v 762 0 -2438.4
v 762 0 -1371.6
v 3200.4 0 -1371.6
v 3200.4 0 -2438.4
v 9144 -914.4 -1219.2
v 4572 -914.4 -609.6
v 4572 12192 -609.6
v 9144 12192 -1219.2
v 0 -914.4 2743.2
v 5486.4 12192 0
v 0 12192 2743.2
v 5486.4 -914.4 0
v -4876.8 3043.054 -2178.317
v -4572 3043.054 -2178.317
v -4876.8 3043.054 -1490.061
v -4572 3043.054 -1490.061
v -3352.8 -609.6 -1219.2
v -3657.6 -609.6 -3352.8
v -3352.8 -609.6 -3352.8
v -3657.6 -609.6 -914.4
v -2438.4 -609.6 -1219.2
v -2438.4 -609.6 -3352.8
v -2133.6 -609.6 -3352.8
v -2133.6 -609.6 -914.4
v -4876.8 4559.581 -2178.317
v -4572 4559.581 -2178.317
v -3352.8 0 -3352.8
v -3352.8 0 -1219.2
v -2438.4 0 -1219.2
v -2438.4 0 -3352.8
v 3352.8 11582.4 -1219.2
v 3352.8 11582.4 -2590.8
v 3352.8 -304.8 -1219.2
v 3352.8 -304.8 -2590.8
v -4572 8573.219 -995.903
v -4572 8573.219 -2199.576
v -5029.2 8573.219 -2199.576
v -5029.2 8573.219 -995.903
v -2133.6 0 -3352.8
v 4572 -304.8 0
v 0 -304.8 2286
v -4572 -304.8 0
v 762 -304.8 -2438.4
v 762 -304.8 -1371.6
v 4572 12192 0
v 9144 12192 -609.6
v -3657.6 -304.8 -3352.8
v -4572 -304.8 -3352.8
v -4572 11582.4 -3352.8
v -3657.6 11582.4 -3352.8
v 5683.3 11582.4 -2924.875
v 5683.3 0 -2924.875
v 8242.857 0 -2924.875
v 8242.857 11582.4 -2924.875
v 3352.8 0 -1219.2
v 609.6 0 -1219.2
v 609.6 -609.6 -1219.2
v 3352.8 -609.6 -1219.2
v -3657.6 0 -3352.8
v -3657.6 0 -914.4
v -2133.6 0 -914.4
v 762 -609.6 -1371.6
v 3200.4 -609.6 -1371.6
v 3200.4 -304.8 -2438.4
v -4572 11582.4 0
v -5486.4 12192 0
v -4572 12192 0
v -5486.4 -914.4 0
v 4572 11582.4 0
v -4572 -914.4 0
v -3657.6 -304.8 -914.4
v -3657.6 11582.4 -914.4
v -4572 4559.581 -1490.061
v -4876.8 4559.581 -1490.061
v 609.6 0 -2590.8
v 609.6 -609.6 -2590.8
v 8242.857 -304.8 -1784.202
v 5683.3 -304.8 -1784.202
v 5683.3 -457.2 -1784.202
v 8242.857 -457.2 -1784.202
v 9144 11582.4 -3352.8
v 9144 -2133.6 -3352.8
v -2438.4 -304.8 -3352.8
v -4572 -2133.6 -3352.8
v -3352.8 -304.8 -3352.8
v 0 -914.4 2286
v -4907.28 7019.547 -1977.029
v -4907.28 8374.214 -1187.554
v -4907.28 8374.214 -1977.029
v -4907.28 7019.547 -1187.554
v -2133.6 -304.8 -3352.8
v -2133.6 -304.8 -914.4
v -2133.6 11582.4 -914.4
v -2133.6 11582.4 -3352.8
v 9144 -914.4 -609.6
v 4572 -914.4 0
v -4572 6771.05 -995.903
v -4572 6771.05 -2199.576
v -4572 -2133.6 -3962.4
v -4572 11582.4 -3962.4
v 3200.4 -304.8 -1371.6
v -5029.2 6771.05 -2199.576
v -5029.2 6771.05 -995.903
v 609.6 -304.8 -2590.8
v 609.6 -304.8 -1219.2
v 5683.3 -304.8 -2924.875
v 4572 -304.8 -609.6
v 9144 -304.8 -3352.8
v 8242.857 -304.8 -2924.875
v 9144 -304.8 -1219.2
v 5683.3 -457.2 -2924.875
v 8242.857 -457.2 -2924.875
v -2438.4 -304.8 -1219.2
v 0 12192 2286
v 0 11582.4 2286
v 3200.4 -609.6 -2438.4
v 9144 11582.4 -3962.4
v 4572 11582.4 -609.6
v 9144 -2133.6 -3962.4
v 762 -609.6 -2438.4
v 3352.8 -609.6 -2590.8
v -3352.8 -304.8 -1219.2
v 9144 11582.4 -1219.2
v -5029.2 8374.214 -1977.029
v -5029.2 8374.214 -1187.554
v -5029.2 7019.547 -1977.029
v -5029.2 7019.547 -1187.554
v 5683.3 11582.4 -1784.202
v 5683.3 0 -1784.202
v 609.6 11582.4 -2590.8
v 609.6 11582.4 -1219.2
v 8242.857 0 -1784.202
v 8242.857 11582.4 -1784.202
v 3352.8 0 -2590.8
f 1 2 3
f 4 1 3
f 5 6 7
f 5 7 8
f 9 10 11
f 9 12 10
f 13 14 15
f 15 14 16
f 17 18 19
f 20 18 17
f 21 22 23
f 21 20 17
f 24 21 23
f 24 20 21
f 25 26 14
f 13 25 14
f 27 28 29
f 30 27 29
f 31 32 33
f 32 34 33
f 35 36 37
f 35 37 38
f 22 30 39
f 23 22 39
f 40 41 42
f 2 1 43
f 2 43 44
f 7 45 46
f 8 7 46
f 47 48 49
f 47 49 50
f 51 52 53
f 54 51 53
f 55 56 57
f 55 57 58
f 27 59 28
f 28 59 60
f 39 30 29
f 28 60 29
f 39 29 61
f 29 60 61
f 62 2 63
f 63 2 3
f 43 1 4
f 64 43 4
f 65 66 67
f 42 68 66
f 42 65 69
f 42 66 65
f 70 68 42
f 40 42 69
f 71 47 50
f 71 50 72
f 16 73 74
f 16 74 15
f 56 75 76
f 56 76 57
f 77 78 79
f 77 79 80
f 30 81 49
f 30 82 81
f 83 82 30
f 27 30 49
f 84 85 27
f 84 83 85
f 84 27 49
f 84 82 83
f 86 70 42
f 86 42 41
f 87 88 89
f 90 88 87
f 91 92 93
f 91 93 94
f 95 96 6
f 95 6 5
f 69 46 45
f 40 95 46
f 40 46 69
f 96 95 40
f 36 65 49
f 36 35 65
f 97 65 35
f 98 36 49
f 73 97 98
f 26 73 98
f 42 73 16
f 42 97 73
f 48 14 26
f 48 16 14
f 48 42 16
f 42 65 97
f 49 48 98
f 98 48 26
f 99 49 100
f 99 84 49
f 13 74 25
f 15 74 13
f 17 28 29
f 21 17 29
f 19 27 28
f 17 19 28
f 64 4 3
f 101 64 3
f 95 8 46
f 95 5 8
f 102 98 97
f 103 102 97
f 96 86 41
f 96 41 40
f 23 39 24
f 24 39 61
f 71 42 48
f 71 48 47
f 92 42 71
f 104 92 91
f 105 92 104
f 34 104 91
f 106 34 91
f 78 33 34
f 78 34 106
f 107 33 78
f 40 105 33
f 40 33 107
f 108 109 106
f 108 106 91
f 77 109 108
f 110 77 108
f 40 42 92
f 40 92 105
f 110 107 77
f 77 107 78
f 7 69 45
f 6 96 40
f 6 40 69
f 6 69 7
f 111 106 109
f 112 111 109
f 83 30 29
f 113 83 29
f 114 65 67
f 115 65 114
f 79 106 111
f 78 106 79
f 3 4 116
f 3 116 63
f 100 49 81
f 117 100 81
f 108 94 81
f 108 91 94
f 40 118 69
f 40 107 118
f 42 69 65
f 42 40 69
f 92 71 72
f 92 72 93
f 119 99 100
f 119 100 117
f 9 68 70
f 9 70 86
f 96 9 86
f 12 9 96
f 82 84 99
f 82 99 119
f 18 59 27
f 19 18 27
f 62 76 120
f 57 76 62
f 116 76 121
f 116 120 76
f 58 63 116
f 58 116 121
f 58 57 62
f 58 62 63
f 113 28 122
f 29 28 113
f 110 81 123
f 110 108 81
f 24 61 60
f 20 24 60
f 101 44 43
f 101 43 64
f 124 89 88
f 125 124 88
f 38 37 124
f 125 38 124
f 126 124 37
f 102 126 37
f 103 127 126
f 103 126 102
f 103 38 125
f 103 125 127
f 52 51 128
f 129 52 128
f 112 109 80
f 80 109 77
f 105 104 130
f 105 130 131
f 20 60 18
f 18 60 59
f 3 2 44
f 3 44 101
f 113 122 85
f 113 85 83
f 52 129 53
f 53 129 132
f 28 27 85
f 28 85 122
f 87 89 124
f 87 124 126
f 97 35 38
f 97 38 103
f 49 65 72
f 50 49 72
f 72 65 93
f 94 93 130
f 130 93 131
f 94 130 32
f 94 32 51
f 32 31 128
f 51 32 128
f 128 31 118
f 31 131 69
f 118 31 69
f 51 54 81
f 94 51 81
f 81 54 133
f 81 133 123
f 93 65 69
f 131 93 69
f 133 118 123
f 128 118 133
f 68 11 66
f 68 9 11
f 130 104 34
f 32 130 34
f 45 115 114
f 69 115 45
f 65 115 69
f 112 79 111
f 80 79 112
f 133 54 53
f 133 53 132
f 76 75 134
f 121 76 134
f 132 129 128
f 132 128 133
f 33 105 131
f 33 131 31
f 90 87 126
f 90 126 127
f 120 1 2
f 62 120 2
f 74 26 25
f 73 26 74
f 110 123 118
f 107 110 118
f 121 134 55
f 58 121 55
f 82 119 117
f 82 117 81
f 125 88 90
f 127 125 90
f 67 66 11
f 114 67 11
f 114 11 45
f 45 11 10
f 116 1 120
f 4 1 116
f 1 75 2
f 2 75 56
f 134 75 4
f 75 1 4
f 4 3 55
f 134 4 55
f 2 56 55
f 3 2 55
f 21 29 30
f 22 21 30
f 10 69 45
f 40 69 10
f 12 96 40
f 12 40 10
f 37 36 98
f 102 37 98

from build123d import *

# Parameters (mm, degrees)
F1_DEPTH      = 914.4
F1_DEPTH_BACK = 12192
F2_DEPTH      = 304.8
F2_DEPTH_BACK = 11582.4
F0_W          = 4572
F0_H          = 609.6
F3_DEPTH      = 2133.6
F3_DEPTH_BACK = 11582.4
F0_W_2        = 2743.2
F0_H_2        = 1371.6
F0_W_3        = 2559.5574378967
F0_H_3        = 1140.672326088
F4_DEPTH      = 304.8
F4_DEPTH_BACK = 11582.4
F0_W_4        = 914.4
F0_H_4        = 2133.6
F5_DEPTH      = 304.8
F0_W_5        = 2438.4
F0_H_5        = 1066.8
F6_DEPTH      = 609.6
F7_W          = 1354.6671867371
F7_H          = 789.4748449326
F8_DEPTH      = 30.48
F7_W_2        = 1802.1693229675
F7_H_2        = 1203.6726474762
F9_DEPTH      = 457.2
F10_DEPTH     = 304.8
F7_W_3        = 1516.5266990662
F7_H_3        = 688.2555484772
F11_DEPTH     = 304.8
F0_W_6        = 1864.025592804
F0_H_6        = 417.3192977905
F13_DEPTH     = 457.2


# Not quite as in the source:
# - the program builds the solid bodies; features that only make, move or delete a surface that nothing else refers to are left out


with BuildPart() as f1:
    # F0 (on Front) → F1 (new body, two sides)
    with BuildSketch(Plane.XZ) as f1_sk:
        Polygon((-5486.4, 0), (-4572, 0), (0, 2286), (0, 2743.2), align=None)
        Polygon((0, 2286), (4572, 0), (5486.4, 0), (0, 2743.2), align=None)
    extrude(amount=F1_DEPTH)
    extrude(f1_sk.sketch, amount=-F1_DEPTH_BACK)



with BuildPart() as f1b:
    # F0 (on Front) → F1, piece 2 (new body, two sides)
    with BuildSketch(Plane.XZ) as f1_2_sk:
        Polygon((9144, -609.6), (4572, 0), (4572, -609.6), (9144, -1219.2), align=None)
    extrude(amount=F1_DEPTH)
    extrude(f1_2_sk.sketch, amount=-F1_DEPTH_BACK)


with BuildPart() as f1_1:
    add(f1.part)

    add(f1b.part)  # F2 merges F1b
    # F0 (on Front) → F2 (join, two sides)
    with BuildSketch(Plane.XZ) as f2_sk:
        Polygon((-4572, 0), (0, 0), (0, 2286), align=None)
        Polygon((0, 2286), (0, 0), (4572, 0), align=None)
    extrude(amount=F2_DEPTH)
    extrude(f2_sk.sketch, amount=-F2_DEPTH_BACK)


with BuildPart() as f3:
    # F0 (on Front) → F3 (new body, two sides)
    with BuildSketch(Plane.XZ) as f3_sk:
        Polygon((-3657.6, -3352.8), (-4572, -3352.8), (-4572, -3962.4), (4572, -3962.4), (4572, -3352.8), (-2133.6, -3352.8), (-2438.4, -3352.8), (-3352.8, -3352.8), align=None)
        with Locations((6858, -3657.6)):
            Rectangle(F0_W, F0_H)
    extrude(amount=F3_DEPTH)
    extrude(f3_sk.sketch, amount=-F3_DEPTH_BACK)

    # F0 (on Front) → F5 (join)
    with BuildSketch(Plane.XZ):
        with Locations((-2895.6, -2286)):
            Rectangle(F0_W_4, F0_H_4)
    extrude(amount=F5_DEPTH)


with BuildPart() as f4:
    # F0 (on Front) → F4 (new body, two sides)
    with BuildSketch(Plane.XZ) as f4_sk:
        Polygon((4572, 0), (0, 0), (-4572, 0), (-4572, -3352.8), (-3657.6, -3352.8), (-3657.6, -914.4), (-2133.6, -914.4), (-2133.6, -3352.8), (4572, -3352.8), (4572, -609.6), align=None)
        with Locations((1981.2, -1905)):
            Rectangle(F0_W_2, F0_H_2, mode=Mode.SUBTRACT)
        Polygon((9144, -1219.2), (4572, -609.6), (4572, -3352.8), (9144, -3352.8), align=None)
        with Locations((6963.0782604218, -2354.5383810997)):
            Rectangle(F0_W_3, F0_H_3, mode=Mode.SUBTRACT)
    extrude(amount=F4_DEPTH)
    extrude(f4_sk.sketch, amount=-F4_DEPTH_BACK)

    # F7 (on face) → F8 (join)
    with BuildSketch(Plane(origin=(-4572, 0, 0), x_dir=(0, -1, 0), z_dir=(-1, 0, 0))):
        with Locations((-7696.8805789948, -1582.2919011116)):
            Rectangle(F7_W, F7_H)
    extrude(amount=F8_DEPTH)

    # F7 (on face) → F9 (join)
    with BuildSketch(Plane(origin=(-4572, 0, 0), x_dir=(0, -1, 0), z_dir=(-1, 0, 0))):
        with Locations((-7672.1346378326, -1597.7395772934)):
            Rectangle(F7_W_2, F7_H_2)
        with Locations((-7696.8805789948, -1582.2919011116)):
            Rectangle(F7_W, F7_H, mode=Mode.SUBTRACT)
    extrude(amount=F9_DEPTH)

    # F10 (add): a face of the model
    f10_faces = [f4.faces().sort_by_distance(p)[0] for p in [
        (-4602.48, 7696.8805789948, -1582.2919011116),
    ]]
    extrude(f10_faces, amount=F10_DEPTH)

    # F7 (on face) → F11 (join)
    with BuildSketch(Plane(origin=(-4572, 0, 0), x_dir=(0, -1, 0), z_dir=(-1, 0, 0))):
        with Locations((-3801.3174533844, -1834.1888189316)):
            Rectangle(F7_W_3, F7_H_3)
    extrude(amount=F11_DEPTH)

    # F0 (on Front) → F13 (join)
    with BuildSketch(Plane.XZ):
        with Locations((6963.0782604218, -2354.5383810997)):
            Rectangle(F0_W_3, F0_H_3)
        with Locations((6976.9885540009, -2382.3595046997)):
            Rectangle(F0_W_6, F0_H_6, mode=Mode.SUBTRACT)
        with Locations((6976.9885540009, -2382.3595046997)):
            Rectangle(F0_W_6, F0_H_6)
    extrude(amount=F13_DEPTH)


with BuildPart() as f5:
    # F0 (on Front) → F5, piece 2 (new body)
    with BuildSketch(Plane.XZ):
        with Locations((1981.2, -1905)):
            Rectangle(F0_W_5, F0_H_5)
    extrude(amount=F5_DEPTH)


with BuildPart() as f6:
    # F0 (on Front) → F6 (new body)
    with BuildSketch(Plane.XZ):
        with Locations((1981.2, -1905)):
            Rectangle(F0_W_2, F0_H_2)
        with Locations((1981.2, -1905)):
            Rectangle(F0_W_5, F0_H_5, mode=Mode.SUBTRACT)
    extrude(amount=F6_DEPTH)


with BuildPart() as f6b:
    # F0 (on Front) → F6, piece 2 (new body)
    with BuildSketch(Plane.XZ):
        Polygon((-3657.6, -914.4), (-3657.6, -3352.8), (-3352.8, -3352.8), (-3352.8, -1219.2), (-2438.4, -1219.2), (-2438.4, -3352.8), (-2133.6, -3352.8), (-2133.6, -914.4), align=None)
    extrude(amount=F6_DEPTH)


solid = Compound([f1_1.part, f3.part, f4.part, f5.part, f6.part, f6b.part])
